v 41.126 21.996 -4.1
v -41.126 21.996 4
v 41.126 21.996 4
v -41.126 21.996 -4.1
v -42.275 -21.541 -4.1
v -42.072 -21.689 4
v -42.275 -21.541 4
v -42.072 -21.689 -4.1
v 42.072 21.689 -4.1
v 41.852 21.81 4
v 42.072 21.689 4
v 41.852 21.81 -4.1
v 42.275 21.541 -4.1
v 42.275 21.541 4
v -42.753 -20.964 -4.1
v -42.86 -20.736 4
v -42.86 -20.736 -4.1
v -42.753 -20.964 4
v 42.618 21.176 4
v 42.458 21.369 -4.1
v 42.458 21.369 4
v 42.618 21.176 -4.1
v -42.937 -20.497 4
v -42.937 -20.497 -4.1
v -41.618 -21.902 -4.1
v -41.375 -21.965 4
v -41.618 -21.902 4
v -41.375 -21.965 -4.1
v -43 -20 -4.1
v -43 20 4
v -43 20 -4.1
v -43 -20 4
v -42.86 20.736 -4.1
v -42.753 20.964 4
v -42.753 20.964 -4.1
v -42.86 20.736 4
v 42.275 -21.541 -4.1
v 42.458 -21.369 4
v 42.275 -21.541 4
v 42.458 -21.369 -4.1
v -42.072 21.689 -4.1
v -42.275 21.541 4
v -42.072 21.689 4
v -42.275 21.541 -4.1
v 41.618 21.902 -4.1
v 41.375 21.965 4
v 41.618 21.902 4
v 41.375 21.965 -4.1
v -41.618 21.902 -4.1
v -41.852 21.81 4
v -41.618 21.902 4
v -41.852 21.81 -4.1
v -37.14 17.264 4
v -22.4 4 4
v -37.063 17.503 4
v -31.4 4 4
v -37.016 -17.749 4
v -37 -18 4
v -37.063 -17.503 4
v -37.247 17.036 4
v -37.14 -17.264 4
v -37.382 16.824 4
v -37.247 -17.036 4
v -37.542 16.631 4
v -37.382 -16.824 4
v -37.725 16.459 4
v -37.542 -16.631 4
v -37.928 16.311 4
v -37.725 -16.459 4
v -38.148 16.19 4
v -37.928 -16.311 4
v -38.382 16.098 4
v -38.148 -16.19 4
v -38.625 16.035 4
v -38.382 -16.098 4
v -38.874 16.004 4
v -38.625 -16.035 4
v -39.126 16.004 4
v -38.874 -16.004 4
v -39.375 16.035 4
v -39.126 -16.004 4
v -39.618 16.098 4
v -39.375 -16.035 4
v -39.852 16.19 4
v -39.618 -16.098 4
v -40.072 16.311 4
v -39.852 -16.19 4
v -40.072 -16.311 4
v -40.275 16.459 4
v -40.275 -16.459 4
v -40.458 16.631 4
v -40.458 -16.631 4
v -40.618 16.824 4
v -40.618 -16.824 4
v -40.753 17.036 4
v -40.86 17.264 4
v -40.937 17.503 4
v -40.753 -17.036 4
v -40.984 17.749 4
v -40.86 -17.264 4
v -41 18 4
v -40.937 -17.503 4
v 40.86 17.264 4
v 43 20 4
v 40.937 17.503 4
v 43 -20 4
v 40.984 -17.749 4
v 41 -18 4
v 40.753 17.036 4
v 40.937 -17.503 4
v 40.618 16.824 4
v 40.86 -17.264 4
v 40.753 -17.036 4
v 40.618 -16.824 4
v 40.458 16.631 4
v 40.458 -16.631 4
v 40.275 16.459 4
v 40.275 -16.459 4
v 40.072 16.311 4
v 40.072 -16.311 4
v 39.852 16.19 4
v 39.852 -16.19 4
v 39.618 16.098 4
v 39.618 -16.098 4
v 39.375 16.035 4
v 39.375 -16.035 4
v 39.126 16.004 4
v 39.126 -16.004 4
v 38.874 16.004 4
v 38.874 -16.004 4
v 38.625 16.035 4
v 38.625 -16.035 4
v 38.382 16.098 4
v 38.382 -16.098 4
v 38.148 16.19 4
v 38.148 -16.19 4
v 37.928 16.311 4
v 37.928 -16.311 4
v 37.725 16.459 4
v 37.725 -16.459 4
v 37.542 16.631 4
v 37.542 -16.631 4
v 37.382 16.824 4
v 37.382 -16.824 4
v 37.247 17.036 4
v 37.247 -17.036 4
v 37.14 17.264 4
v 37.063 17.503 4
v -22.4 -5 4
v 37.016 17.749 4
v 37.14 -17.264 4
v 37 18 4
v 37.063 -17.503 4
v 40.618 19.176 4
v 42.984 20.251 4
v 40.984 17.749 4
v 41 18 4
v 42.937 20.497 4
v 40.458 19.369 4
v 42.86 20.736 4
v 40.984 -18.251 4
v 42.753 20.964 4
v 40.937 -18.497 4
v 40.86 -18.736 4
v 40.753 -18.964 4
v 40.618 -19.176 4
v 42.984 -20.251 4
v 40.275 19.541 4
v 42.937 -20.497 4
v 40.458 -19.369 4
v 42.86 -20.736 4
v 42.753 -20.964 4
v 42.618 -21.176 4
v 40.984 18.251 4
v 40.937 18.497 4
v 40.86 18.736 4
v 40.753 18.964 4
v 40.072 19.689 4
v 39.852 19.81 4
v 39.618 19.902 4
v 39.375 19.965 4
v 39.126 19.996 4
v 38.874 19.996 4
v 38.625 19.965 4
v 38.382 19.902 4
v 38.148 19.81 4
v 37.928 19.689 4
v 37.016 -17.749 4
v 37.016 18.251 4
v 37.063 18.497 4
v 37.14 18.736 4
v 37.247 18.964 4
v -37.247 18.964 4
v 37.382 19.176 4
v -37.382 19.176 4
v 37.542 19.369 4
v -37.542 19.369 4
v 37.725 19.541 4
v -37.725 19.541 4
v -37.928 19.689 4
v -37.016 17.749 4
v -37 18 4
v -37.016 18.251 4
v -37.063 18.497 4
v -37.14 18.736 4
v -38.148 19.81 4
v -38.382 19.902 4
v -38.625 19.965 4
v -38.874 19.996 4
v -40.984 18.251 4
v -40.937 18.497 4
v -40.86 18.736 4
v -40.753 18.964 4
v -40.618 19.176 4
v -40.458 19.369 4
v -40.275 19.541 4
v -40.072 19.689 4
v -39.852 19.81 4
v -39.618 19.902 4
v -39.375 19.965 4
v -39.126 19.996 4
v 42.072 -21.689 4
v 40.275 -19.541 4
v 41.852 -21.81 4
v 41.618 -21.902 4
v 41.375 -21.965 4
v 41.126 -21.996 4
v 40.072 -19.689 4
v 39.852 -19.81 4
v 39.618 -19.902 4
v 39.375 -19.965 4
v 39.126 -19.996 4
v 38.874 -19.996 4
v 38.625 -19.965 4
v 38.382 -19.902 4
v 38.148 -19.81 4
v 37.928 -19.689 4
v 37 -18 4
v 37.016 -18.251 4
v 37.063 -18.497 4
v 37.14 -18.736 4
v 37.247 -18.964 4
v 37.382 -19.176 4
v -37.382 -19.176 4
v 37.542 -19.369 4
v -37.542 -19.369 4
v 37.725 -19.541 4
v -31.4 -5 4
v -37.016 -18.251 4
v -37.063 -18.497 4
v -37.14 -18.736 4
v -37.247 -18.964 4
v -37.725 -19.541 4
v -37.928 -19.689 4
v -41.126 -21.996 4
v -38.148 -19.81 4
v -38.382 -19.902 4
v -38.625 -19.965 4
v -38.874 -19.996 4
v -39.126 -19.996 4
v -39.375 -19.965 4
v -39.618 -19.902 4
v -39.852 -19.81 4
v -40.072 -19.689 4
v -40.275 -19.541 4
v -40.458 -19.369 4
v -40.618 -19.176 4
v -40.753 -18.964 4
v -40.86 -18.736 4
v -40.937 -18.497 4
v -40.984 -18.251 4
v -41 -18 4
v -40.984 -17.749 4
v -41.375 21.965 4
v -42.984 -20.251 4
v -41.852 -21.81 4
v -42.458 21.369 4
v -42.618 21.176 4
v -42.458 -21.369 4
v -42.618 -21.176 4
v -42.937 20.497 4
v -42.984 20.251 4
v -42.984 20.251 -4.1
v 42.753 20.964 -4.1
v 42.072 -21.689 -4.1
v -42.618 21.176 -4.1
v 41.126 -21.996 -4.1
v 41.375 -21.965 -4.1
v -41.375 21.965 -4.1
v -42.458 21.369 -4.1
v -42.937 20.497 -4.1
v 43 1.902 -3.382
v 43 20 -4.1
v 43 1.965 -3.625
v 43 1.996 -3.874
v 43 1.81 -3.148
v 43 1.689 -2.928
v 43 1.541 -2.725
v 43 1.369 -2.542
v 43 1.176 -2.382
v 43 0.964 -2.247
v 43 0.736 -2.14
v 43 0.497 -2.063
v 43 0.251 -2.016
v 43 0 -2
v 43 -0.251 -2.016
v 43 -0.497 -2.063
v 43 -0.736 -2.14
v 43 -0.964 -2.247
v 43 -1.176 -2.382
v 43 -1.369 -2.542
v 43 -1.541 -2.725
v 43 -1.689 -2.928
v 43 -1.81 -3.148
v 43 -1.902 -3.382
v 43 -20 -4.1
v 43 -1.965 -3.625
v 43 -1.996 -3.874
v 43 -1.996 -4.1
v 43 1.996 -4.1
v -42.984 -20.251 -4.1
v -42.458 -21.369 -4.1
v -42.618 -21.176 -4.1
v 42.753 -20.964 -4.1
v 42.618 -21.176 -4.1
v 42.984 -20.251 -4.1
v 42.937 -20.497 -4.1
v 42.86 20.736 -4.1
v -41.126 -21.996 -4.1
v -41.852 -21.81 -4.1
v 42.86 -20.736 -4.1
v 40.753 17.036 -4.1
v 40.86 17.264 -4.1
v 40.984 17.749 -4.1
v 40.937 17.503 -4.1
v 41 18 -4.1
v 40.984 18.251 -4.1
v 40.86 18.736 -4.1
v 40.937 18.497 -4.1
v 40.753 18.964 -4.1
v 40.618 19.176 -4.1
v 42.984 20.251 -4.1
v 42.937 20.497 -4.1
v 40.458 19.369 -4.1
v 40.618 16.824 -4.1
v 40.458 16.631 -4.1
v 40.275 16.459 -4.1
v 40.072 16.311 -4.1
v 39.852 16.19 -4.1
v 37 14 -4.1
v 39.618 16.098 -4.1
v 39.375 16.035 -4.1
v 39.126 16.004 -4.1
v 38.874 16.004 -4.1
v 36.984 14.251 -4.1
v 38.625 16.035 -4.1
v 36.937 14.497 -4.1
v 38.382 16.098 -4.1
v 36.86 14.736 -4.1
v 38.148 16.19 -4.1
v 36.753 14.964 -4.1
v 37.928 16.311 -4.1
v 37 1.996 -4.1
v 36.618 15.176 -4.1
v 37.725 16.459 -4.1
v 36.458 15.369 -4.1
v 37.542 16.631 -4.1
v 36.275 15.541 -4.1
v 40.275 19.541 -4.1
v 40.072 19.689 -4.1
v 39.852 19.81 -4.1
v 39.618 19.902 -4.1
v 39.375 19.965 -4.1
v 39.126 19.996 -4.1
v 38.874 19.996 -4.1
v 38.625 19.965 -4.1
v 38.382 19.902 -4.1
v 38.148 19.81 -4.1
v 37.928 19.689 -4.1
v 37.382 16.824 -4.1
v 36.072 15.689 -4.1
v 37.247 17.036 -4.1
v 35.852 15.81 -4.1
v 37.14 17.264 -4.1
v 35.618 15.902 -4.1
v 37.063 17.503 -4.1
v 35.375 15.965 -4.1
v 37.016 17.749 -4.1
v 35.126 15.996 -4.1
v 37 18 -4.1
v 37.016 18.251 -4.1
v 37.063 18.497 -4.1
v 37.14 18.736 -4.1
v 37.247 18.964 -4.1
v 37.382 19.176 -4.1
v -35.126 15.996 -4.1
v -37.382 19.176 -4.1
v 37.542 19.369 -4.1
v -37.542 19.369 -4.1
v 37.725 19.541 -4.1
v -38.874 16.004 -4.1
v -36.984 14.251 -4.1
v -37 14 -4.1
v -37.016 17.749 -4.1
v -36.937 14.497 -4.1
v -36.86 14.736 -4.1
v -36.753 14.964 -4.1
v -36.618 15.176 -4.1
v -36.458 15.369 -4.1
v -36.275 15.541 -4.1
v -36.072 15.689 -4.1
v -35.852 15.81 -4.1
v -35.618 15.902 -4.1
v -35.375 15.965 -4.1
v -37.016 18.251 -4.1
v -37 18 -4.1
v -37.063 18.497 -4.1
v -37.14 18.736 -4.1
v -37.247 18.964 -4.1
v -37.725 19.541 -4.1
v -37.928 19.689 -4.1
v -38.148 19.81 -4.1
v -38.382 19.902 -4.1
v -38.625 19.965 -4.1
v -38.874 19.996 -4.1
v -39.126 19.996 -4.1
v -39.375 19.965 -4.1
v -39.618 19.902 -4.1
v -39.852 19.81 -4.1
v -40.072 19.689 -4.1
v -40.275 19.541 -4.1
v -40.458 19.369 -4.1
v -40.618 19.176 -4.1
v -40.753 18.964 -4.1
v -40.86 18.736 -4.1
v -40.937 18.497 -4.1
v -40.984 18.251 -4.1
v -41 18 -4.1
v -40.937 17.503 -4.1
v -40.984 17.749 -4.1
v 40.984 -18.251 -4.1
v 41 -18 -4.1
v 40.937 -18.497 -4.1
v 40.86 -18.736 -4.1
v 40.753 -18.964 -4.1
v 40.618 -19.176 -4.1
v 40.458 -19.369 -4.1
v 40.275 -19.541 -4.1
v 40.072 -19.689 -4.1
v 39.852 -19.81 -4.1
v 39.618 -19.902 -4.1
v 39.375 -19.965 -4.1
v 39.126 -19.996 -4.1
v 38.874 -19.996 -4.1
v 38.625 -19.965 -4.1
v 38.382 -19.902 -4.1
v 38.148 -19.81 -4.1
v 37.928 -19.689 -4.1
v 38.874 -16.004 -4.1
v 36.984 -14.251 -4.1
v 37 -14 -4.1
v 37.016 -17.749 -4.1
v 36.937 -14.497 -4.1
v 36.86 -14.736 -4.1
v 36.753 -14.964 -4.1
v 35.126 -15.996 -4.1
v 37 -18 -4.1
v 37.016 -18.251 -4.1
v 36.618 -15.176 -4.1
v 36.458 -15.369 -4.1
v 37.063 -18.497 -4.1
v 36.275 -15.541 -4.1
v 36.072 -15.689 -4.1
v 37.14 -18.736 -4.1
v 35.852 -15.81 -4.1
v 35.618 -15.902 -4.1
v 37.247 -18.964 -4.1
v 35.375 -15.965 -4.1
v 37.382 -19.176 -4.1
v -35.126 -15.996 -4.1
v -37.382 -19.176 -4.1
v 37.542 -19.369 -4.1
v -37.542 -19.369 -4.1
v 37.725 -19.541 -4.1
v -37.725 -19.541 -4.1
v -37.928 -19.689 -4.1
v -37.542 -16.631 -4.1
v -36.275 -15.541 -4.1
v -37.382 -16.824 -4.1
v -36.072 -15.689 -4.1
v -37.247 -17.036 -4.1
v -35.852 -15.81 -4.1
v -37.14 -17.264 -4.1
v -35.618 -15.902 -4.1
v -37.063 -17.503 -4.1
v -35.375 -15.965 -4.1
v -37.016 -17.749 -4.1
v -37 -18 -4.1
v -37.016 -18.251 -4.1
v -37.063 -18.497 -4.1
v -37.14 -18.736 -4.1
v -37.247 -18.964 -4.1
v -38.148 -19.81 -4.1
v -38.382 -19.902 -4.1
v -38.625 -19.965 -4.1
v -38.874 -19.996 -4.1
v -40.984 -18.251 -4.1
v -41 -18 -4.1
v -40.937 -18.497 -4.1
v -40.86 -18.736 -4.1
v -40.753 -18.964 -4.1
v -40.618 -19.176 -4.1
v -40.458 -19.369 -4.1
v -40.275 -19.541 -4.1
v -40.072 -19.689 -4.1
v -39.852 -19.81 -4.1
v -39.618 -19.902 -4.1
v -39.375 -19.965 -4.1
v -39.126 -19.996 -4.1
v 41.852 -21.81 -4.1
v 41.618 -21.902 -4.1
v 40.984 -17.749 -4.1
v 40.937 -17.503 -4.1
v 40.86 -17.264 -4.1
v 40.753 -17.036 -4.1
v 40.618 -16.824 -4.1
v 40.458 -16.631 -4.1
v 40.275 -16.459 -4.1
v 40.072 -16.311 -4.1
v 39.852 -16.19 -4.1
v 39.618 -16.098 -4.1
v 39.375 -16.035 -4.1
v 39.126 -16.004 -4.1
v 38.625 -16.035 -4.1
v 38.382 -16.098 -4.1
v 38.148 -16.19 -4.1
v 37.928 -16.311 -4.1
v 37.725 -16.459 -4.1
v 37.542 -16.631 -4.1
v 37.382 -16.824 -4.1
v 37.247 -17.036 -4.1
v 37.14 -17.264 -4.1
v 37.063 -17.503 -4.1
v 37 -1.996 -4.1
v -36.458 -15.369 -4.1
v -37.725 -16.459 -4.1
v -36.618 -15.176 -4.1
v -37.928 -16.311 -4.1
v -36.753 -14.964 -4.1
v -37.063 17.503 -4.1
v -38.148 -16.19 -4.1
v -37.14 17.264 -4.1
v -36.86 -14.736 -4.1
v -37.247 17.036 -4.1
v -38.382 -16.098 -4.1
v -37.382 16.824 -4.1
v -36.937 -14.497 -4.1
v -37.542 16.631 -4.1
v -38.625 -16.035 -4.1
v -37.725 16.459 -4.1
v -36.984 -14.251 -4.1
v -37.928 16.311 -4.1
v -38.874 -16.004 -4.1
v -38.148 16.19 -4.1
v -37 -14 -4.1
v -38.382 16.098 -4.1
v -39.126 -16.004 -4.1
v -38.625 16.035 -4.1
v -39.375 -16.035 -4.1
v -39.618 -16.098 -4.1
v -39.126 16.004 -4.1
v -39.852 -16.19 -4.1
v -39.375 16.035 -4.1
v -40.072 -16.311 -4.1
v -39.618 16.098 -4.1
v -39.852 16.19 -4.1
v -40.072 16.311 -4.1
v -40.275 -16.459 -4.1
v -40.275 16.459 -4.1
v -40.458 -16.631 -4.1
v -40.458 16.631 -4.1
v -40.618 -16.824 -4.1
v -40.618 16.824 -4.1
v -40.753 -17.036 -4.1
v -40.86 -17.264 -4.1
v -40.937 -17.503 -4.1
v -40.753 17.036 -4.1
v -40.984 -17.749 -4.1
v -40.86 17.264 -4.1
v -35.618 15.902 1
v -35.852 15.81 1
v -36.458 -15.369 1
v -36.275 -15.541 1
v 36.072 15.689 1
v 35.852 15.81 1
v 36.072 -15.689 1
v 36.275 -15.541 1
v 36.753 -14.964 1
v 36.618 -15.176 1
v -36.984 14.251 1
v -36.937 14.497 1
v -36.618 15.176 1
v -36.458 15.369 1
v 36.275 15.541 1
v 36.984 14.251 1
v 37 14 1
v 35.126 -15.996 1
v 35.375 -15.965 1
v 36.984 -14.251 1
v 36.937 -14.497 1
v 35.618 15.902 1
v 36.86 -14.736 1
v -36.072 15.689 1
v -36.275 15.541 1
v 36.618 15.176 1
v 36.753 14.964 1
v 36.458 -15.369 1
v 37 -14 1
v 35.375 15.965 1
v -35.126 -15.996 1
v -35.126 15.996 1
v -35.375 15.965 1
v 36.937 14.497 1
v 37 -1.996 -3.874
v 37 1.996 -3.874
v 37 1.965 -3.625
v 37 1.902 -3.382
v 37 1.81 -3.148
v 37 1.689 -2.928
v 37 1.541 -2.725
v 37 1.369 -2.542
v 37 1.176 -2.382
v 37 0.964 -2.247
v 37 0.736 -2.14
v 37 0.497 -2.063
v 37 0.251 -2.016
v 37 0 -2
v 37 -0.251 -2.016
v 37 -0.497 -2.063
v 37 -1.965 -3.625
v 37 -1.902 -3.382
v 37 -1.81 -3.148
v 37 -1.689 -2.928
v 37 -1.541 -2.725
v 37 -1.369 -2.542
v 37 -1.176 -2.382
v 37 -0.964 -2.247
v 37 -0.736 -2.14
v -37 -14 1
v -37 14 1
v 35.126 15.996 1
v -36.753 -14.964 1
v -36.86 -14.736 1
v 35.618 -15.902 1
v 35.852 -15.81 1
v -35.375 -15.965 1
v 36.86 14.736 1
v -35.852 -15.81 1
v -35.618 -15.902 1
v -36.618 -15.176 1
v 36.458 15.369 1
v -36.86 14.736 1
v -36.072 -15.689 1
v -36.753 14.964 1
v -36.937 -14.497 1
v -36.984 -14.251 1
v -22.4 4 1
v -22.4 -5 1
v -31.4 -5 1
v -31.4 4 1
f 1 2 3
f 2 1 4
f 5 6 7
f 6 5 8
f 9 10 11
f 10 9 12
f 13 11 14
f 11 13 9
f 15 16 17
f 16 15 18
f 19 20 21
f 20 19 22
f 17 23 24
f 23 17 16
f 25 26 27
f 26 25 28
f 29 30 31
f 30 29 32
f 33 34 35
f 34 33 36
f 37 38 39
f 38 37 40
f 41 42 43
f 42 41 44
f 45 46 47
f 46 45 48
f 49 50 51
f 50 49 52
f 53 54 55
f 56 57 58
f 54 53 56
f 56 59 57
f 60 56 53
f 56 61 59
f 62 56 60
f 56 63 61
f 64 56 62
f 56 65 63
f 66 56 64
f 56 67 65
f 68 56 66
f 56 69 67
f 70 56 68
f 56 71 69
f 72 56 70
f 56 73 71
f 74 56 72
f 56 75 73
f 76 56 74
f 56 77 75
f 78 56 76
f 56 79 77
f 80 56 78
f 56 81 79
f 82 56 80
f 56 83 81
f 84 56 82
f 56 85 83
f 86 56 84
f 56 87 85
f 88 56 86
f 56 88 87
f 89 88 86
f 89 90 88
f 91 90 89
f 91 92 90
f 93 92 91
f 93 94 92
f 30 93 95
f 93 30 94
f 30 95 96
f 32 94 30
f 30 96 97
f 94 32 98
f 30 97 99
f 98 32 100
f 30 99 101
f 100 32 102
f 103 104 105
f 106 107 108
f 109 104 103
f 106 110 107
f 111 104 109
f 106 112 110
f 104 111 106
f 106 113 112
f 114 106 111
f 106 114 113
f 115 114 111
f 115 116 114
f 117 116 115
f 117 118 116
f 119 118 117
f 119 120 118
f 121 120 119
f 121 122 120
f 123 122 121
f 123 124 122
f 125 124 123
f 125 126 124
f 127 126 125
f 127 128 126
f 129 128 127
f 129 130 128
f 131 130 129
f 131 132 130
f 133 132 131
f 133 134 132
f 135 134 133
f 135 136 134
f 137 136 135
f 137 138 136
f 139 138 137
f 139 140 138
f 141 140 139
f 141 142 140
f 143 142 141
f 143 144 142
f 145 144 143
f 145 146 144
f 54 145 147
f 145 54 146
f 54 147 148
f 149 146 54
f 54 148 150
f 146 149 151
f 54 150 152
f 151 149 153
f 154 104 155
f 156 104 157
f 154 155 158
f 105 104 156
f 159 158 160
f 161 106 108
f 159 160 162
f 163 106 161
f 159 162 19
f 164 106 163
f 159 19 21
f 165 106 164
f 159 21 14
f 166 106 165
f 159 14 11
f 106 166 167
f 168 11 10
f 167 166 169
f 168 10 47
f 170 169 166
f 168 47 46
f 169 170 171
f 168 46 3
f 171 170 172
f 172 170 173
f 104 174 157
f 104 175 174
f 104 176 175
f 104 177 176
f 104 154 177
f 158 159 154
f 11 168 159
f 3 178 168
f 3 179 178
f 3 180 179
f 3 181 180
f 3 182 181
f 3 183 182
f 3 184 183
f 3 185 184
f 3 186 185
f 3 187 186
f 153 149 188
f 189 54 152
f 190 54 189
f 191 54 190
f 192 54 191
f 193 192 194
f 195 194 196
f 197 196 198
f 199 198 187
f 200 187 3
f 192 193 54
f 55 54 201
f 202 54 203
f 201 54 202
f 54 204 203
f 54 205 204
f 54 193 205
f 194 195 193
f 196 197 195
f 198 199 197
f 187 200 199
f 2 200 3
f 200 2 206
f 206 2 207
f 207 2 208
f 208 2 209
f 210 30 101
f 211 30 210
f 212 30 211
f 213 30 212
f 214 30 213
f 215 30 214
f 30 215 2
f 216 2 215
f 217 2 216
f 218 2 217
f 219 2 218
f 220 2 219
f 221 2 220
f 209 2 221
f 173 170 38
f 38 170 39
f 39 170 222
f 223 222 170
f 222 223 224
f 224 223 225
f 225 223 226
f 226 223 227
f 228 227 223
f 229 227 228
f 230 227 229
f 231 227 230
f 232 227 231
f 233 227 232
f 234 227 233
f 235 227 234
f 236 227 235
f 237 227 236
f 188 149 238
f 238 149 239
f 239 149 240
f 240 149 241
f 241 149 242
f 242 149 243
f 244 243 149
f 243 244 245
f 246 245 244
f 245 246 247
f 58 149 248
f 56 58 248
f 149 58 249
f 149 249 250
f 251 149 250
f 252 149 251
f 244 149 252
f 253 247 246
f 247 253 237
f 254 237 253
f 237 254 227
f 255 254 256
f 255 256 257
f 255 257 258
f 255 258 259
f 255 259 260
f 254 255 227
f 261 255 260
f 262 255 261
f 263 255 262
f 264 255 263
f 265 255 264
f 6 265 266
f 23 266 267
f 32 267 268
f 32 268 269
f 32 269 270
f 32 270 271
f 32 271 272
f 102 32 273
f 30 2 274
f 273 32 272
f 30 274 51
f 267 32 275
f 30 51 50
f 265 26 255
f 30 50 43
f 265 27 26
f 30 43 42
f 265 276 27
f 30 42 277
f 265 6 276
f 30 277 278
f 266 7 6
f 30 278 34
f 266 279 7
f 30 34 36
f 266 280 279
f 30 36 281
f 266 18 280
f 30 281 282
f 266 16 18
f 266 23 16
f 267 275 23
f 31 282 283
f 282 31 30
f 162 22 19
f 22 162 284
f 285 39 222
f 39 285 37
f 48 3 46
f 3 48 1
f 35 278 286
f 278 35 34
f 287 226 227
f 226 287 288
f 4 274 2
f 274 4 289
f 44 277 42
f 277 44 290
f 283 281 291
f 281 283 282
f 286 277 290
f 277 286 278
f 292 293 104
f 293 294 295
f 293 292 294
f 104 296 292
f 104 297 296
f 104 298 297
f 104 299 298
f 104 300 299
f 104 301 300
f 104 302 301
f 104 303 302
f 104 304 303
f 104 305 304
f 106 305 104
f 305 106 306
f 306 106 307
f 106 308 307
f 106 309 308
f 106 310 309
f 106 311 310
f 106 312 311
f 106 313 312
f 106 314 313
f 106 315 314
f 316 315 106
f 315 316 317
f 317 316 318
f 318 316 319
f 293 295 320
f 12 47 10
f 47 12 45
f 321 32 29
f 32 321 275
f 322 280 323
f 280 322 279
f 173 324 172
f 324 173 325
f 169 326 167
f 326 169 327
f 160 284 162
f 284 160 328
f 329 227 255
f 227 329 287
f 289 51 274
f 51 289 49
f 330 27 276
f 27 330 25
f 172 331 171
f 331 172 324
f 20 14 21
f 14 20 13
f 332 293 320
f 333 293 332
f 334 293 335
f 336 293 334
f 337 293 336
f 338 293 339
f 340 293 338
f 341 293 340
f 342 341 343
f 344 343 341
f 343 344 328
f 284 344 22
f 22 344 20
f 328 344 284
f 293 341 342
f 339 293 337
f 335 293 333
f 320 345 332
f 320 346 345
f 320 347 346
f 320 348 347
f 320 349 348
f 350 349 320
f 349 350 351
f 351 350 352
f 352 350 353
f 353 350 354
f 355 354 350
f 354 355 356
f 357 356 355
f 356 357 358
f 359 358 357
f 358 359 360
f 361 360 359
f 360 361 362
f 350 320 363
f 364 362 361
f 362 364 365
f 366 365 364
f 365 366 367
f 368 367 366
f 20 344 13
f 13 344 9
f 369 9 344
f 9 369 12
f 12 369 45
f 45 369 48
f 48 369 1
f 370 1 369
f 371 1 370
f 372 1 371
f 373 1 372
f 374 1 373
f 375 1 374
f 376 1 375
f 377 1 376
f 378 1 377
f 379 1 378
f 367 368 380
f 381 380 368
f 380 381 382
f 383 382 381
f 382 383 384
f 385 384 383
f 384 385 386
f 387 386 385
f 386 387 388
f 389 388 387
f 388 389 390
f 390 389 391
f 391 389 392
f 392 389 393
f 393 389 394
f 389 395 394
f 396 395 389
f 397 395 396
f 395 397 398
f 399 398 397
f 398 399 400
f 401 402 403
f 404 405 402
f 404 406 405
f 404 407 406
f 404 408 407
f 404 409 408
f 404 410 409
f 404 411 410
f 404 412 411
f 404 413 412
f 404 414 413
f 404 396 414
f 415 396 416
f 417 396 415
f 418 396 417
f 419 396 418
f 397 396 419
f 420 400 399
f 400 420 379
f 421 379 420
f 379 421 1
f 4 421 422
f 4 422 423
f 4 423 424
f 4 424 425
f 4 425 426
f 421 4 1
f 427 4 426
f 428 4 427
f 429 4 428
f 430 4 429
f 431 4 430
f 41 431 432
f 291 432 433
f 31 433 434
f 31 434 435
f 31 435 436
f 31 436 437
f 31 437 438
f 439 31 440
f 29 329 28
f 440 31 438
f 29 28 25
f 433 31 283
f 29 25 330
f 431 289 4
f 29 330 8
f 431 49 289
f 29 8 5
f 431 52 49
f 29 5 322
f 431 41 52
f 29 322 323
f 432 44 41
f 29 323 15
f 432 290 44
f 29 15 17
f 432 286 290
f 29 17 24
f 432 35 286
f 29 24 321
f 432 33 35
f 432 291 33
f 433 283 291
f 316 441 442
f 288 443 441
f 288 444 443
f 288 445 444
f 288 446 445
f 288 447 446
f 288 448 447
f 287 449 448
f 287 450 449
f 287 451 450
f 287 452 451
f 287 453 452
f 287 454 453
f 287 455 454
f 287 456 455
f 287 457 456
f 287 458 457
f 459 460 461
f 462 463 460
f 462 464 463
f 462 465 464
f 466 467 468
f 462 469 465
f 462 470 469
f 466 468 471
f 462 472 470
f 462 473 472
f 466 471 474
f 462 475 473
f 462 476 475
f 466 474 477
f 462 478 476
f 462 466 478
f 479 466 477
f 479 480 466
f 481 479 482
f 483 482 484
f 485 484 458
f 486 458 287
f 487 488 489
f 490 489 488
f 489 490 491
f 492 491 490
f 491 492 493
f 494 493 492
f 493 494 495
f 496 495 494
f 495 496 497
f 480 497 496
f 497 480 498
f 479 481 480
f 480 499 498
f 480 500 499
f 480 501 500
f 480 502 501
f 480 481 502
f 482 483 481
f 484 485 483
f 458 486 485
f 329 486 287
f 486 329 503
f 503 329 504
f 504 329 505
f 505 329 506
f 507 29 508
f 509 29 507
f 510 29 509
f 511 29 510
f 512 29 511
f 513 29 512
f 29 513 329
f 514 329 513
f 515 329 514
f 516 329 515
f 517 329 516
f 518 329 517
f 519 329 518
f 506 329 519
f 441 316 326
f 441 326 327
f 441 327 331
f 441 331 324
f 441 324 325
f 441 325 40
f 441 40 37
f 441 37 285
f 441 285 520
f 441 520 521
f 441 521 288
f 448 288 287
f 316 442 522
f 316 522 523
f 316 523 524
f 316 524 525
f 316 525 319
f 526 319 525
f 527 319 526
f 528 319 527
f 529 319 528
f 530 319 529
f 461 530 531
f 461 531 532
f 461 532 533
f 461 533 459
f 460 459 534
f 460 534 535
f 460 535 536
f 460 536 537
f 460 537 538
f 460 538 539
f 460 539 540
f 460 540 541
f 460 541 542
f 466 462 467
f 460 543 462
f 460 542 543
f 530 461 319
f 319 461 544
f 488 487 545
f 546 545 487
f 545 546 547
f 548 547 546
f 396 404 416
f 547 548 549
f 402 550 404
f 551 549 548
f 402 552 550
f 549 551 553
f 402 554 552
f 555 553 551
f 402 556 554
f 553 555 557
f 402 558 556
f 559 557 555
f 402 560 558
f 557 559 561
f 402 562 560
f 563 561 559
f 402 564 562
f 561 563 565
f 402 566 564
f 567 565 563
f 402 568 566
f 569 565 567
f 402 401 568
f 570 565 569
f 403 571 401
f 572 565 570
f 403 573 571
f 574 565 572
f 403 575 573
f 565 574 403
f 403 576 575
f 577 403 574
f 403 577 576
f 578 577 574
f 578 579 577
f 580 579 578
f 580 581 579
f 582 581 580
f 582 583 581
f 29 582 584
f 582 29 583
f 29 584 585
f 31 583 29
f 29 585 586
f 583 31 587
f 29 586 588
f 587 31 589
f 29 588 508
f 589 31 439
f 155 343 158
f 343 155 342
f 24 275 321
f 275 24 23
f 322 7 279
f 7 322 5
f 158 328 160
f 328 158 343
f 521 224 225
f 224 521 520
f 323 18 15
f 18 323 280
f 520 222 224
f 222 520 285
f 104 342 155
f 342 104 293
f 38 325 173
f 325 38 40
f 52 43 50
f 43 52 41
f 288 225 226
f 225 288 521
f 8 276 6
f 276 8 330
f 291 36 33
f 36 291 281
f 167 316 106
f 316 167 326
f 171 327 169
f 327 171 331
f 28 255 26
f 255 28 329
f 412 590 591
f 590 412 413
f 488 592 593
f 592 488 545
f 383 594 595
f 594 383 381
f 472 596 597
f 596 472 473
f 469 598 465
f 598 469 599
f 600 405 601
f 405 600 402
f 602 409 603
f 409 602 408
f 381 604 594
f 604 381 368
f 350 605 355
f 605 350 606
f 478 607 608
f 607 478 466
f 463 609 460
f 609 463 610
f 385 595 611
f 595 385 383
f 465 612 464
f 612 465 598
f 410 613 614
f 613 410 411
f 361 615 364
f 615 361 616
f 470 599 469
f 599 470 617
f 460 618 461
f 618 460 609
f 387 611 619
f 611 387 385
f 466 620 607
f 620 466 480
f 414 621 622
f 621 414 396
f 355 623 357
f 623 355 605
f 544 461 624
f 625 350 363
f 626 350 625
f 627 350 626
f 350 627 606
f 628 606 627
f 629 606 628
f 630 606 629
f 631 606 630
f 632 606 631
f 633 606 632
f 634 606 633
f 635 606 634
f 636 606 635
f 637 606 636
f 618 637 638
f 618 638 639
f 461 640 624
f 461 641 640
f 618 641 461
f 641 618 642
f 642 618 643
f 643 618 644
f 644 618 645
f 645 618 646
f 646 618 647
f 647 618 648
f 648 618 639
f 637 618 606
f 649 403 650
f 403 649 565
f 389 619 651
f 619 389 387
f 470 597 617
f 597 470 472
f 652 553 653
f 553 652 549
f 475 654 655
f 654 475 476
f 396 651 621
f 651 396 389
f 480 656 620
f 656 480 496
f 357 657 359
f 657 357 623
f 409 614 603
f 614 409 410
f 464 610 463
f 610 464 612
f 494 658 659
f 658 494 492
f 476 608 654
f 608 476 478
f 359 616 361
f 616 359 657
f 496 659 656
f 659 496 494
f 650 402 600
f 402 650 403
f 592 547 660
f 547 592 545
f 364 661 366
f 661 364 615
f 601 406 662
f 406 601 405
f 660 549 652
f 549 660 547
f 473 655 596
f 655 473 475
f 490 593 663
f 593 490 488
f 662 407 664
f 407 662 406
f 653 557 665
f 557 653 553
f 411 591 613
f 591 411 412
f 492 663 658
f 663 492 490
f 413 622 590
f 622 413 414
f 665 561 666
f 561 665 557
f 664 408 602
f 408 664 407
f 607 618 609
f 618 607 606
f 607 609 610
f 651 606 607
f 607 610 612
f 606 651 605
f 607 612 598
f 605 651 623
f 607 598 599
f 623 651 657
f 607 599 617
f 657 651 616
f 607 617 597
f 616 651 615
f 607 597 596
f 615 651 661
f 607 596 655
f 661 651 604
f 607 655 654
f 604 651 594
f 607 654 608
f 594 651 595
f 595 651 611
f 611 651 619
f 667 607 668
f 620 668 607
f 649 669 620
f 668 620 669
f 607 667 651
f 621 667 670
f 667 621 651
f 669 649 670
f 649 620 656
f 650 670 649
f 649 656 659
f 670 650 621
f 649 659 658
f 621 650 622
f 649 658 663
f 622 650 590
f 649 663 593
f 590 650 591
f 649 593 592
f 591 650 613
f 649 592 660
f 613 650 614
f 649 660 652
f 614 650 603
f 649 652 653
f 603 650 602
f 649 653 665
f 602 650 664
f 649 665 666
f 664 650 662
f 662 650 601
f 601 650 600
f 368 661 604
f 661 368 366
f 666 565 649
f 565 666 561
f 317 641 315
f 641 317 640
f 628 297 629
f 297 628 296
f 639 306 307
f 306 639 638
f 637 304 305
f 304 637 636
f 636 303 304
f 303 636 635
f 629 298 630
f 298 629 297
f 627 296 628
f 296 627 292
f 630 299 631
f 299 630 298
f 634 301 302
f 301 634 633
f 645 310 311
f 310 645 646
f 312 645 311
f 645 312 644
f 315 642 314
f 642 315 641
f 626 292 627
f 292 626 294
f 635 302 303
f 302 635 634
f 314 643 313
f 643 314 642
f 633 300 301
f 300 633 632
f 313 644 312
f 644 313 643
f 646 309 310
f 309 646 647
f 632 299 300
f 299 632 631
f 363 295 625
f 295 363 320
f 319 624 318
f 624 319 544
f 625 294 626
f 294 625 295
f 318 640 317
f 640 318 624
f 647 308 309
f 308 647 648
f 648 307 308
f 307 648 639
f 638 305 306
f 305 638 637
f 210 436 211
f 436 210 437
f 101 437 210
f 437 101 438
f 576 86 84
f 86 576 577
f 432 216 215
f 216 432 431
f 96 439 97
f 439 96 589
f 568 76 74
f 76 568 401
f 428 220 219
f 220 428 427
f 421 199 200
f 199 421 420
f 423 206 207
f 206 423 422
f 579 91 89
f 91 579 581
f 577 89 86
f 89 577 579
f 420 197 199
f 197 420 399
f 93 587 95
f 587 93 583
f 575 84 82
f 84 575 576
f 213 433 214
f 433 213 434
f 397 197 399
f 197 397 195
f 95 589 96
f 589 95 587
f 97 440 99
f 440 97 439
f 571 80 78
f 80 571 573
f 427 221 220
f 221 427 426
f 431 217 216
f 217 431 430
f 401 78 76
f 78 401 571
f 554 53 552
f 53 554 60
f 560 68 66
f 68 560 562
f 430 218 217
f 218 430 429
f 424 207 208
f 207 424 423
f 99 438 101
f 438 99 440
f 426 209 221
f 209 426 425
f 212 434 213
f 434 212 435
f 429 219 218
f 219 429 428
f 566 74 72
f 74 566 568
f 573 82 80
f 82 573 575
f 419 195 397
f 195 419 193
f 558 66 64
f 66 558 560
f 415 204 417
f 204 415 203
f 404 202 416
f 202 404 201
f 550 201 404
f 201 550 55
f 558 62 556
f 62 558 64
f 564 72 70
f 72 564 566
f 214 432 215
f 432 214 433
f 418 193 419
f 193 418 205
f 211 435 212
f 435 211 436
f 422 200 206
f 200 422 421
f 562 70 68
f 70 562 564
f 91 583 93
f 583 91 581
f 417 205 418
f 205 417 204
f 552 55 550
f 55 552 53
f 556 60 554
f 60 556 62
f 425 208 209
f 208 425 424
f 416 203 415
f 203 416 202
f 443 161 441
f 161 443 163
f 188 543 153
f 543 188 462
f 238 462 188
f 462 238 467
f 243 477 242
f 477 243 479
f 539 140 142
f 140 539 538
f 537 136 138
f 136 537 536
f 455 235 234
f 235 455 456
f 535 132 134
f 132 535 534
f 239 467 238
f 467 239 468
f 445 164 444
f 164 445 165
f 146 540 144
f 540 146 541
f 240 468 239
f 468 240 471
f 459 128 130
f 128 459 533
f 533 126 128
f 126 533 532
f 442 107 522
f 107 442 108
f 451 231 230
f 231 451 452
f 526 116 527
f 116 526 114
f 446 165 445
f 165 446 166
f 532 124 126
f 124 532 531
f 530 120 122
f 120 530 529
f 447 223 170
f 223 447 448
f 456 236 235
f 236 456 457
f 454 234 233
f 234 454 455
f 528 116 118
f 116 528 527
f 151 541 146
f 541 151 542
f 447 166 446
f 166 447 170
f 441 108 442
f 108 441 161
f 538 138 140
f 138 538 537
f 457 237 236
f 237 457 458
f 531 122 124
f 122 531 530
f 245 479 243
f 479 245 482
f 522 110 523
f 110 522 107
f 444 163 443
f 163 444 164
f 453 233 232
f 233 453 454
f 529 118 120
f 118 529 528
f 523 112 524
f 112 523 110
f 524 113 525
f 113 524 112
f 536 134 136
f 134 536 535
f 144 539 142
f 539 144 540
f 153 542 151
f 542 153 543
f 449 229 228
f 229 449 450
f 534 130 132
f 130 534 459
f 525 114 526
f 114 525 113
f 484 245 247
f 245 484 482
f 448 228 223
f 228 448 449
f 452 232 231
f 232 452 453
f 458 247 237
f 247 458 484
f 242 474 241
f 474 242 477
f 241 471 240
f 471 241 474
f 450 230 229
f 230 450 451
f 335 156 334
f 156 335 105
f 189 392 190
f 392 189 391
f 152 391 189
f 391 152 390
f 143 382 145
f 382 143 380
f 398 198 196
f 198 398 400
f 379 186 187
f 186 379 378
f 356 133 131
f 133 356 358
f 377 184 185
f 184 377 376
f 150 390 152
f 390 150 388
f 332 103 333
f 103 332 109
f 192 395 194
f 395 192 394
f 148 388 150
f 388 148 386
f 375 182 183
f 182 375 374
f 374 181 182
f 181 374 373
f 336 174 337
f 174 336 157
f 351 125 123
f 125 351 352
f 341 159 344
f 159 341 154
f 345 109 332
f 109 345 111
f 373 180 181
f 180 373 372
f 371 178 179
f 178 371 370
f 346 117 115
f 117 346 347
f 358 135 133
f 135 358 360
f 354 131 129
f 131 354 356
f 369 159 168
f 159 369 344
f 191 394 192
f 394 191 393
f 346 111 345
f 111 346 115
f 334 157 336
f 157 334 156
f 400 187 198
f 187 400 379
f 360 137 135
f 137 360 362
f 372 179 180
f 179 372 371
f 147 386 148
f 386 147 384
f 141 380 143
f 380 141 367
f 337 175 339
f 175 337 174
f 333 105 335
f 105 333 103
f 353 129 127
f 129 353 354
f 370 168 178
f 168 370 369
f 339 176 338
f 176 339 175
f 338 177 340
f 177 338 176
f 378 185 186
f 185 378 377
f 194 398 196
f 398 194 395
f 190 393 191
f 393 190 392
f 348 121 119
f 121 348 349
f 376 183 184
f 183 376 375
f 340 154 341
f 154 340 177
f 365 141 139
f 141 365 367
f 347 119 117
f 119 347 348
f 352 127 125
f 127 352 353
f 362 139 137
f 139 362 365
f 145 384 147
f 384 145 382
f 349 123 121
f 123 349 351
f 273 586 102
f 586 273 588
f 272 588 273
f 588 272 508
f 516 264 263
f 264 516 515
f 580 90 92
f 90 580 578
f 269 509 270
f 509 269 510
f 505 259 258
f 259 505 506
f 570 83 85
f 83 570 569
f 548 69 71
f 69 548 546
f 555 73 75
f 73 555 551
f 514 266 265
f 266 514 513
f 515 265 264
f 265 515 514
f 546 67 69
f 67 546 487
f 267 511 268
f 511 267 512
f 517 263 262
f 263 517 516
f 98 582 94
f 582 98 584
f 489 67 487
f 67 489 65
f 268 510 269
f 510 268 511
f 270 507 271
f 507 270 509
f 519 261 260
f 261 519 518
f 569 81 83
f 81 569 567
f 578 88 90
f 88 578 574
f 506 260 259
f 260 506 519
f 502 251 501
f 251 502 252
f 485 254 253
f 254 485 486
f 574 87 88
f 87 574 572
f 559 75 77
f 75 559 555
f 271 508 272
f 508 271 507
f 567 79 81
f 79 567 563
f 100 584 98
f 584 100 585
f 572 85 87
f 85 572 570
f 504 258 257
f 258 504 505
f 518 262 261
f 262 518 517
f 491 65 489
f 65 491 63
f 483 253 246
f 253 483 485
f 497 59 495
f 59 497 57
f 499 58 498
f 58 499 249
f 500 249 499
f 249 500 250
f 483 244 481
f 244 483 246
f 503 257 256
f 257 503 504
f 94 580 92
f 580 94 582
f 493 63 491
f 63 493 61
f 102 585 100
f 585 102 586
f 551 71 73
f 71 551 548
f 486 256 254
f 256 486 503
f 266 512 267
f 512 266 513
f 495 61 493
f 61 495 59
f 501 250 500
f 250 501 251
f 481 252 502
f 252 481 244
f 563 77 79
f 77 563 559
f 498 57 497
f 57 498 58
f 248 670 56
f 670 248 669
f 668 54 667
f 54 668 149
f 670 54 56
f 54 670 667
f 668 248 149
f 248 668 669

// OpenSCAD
   module
M4ScrewHole(){
cylinder(r=2,h=10,$fn=50);
}
//creates M4 screw hole.

  rotate([0,180,0])difference(){  minkowski(){ cube([82,40,8],center=true); 
cylinder(r=2,h=0.1,$fn=50); 
}  //Creates solid rounded L70,H40,W8 rectangle.

 translate([0,0,2])minkowski(){ cube([70,28,6],center=true); 
cylinder(r=2,h=0.1,$fn=50); 
}  //Creates solid rounded L61,H31,W5 rectangle. W5 is W4+1 to make sure goes all the way through front face. 6mm border, 3mm on either side.
translate([-35,0,4])rotate([0,-90,0])cylinder(r=2,h=10,$fn=50); //Cylindrical cut out for wire

translate([39,18,-5])M4ScrewHole();
translate([-39,-18,-5])M4ScrewHole();
translate([-39,18,-5])M4ScrewHole();
translate([39,-18,-5])M4ScrewHole();
//Four M4 screw holes at corners.

translate([22.4,-5,-5])cube([9,9,5]);
//window for sensor.
} 
//creates hollow shell, 6mm border with M4 holes and window.
